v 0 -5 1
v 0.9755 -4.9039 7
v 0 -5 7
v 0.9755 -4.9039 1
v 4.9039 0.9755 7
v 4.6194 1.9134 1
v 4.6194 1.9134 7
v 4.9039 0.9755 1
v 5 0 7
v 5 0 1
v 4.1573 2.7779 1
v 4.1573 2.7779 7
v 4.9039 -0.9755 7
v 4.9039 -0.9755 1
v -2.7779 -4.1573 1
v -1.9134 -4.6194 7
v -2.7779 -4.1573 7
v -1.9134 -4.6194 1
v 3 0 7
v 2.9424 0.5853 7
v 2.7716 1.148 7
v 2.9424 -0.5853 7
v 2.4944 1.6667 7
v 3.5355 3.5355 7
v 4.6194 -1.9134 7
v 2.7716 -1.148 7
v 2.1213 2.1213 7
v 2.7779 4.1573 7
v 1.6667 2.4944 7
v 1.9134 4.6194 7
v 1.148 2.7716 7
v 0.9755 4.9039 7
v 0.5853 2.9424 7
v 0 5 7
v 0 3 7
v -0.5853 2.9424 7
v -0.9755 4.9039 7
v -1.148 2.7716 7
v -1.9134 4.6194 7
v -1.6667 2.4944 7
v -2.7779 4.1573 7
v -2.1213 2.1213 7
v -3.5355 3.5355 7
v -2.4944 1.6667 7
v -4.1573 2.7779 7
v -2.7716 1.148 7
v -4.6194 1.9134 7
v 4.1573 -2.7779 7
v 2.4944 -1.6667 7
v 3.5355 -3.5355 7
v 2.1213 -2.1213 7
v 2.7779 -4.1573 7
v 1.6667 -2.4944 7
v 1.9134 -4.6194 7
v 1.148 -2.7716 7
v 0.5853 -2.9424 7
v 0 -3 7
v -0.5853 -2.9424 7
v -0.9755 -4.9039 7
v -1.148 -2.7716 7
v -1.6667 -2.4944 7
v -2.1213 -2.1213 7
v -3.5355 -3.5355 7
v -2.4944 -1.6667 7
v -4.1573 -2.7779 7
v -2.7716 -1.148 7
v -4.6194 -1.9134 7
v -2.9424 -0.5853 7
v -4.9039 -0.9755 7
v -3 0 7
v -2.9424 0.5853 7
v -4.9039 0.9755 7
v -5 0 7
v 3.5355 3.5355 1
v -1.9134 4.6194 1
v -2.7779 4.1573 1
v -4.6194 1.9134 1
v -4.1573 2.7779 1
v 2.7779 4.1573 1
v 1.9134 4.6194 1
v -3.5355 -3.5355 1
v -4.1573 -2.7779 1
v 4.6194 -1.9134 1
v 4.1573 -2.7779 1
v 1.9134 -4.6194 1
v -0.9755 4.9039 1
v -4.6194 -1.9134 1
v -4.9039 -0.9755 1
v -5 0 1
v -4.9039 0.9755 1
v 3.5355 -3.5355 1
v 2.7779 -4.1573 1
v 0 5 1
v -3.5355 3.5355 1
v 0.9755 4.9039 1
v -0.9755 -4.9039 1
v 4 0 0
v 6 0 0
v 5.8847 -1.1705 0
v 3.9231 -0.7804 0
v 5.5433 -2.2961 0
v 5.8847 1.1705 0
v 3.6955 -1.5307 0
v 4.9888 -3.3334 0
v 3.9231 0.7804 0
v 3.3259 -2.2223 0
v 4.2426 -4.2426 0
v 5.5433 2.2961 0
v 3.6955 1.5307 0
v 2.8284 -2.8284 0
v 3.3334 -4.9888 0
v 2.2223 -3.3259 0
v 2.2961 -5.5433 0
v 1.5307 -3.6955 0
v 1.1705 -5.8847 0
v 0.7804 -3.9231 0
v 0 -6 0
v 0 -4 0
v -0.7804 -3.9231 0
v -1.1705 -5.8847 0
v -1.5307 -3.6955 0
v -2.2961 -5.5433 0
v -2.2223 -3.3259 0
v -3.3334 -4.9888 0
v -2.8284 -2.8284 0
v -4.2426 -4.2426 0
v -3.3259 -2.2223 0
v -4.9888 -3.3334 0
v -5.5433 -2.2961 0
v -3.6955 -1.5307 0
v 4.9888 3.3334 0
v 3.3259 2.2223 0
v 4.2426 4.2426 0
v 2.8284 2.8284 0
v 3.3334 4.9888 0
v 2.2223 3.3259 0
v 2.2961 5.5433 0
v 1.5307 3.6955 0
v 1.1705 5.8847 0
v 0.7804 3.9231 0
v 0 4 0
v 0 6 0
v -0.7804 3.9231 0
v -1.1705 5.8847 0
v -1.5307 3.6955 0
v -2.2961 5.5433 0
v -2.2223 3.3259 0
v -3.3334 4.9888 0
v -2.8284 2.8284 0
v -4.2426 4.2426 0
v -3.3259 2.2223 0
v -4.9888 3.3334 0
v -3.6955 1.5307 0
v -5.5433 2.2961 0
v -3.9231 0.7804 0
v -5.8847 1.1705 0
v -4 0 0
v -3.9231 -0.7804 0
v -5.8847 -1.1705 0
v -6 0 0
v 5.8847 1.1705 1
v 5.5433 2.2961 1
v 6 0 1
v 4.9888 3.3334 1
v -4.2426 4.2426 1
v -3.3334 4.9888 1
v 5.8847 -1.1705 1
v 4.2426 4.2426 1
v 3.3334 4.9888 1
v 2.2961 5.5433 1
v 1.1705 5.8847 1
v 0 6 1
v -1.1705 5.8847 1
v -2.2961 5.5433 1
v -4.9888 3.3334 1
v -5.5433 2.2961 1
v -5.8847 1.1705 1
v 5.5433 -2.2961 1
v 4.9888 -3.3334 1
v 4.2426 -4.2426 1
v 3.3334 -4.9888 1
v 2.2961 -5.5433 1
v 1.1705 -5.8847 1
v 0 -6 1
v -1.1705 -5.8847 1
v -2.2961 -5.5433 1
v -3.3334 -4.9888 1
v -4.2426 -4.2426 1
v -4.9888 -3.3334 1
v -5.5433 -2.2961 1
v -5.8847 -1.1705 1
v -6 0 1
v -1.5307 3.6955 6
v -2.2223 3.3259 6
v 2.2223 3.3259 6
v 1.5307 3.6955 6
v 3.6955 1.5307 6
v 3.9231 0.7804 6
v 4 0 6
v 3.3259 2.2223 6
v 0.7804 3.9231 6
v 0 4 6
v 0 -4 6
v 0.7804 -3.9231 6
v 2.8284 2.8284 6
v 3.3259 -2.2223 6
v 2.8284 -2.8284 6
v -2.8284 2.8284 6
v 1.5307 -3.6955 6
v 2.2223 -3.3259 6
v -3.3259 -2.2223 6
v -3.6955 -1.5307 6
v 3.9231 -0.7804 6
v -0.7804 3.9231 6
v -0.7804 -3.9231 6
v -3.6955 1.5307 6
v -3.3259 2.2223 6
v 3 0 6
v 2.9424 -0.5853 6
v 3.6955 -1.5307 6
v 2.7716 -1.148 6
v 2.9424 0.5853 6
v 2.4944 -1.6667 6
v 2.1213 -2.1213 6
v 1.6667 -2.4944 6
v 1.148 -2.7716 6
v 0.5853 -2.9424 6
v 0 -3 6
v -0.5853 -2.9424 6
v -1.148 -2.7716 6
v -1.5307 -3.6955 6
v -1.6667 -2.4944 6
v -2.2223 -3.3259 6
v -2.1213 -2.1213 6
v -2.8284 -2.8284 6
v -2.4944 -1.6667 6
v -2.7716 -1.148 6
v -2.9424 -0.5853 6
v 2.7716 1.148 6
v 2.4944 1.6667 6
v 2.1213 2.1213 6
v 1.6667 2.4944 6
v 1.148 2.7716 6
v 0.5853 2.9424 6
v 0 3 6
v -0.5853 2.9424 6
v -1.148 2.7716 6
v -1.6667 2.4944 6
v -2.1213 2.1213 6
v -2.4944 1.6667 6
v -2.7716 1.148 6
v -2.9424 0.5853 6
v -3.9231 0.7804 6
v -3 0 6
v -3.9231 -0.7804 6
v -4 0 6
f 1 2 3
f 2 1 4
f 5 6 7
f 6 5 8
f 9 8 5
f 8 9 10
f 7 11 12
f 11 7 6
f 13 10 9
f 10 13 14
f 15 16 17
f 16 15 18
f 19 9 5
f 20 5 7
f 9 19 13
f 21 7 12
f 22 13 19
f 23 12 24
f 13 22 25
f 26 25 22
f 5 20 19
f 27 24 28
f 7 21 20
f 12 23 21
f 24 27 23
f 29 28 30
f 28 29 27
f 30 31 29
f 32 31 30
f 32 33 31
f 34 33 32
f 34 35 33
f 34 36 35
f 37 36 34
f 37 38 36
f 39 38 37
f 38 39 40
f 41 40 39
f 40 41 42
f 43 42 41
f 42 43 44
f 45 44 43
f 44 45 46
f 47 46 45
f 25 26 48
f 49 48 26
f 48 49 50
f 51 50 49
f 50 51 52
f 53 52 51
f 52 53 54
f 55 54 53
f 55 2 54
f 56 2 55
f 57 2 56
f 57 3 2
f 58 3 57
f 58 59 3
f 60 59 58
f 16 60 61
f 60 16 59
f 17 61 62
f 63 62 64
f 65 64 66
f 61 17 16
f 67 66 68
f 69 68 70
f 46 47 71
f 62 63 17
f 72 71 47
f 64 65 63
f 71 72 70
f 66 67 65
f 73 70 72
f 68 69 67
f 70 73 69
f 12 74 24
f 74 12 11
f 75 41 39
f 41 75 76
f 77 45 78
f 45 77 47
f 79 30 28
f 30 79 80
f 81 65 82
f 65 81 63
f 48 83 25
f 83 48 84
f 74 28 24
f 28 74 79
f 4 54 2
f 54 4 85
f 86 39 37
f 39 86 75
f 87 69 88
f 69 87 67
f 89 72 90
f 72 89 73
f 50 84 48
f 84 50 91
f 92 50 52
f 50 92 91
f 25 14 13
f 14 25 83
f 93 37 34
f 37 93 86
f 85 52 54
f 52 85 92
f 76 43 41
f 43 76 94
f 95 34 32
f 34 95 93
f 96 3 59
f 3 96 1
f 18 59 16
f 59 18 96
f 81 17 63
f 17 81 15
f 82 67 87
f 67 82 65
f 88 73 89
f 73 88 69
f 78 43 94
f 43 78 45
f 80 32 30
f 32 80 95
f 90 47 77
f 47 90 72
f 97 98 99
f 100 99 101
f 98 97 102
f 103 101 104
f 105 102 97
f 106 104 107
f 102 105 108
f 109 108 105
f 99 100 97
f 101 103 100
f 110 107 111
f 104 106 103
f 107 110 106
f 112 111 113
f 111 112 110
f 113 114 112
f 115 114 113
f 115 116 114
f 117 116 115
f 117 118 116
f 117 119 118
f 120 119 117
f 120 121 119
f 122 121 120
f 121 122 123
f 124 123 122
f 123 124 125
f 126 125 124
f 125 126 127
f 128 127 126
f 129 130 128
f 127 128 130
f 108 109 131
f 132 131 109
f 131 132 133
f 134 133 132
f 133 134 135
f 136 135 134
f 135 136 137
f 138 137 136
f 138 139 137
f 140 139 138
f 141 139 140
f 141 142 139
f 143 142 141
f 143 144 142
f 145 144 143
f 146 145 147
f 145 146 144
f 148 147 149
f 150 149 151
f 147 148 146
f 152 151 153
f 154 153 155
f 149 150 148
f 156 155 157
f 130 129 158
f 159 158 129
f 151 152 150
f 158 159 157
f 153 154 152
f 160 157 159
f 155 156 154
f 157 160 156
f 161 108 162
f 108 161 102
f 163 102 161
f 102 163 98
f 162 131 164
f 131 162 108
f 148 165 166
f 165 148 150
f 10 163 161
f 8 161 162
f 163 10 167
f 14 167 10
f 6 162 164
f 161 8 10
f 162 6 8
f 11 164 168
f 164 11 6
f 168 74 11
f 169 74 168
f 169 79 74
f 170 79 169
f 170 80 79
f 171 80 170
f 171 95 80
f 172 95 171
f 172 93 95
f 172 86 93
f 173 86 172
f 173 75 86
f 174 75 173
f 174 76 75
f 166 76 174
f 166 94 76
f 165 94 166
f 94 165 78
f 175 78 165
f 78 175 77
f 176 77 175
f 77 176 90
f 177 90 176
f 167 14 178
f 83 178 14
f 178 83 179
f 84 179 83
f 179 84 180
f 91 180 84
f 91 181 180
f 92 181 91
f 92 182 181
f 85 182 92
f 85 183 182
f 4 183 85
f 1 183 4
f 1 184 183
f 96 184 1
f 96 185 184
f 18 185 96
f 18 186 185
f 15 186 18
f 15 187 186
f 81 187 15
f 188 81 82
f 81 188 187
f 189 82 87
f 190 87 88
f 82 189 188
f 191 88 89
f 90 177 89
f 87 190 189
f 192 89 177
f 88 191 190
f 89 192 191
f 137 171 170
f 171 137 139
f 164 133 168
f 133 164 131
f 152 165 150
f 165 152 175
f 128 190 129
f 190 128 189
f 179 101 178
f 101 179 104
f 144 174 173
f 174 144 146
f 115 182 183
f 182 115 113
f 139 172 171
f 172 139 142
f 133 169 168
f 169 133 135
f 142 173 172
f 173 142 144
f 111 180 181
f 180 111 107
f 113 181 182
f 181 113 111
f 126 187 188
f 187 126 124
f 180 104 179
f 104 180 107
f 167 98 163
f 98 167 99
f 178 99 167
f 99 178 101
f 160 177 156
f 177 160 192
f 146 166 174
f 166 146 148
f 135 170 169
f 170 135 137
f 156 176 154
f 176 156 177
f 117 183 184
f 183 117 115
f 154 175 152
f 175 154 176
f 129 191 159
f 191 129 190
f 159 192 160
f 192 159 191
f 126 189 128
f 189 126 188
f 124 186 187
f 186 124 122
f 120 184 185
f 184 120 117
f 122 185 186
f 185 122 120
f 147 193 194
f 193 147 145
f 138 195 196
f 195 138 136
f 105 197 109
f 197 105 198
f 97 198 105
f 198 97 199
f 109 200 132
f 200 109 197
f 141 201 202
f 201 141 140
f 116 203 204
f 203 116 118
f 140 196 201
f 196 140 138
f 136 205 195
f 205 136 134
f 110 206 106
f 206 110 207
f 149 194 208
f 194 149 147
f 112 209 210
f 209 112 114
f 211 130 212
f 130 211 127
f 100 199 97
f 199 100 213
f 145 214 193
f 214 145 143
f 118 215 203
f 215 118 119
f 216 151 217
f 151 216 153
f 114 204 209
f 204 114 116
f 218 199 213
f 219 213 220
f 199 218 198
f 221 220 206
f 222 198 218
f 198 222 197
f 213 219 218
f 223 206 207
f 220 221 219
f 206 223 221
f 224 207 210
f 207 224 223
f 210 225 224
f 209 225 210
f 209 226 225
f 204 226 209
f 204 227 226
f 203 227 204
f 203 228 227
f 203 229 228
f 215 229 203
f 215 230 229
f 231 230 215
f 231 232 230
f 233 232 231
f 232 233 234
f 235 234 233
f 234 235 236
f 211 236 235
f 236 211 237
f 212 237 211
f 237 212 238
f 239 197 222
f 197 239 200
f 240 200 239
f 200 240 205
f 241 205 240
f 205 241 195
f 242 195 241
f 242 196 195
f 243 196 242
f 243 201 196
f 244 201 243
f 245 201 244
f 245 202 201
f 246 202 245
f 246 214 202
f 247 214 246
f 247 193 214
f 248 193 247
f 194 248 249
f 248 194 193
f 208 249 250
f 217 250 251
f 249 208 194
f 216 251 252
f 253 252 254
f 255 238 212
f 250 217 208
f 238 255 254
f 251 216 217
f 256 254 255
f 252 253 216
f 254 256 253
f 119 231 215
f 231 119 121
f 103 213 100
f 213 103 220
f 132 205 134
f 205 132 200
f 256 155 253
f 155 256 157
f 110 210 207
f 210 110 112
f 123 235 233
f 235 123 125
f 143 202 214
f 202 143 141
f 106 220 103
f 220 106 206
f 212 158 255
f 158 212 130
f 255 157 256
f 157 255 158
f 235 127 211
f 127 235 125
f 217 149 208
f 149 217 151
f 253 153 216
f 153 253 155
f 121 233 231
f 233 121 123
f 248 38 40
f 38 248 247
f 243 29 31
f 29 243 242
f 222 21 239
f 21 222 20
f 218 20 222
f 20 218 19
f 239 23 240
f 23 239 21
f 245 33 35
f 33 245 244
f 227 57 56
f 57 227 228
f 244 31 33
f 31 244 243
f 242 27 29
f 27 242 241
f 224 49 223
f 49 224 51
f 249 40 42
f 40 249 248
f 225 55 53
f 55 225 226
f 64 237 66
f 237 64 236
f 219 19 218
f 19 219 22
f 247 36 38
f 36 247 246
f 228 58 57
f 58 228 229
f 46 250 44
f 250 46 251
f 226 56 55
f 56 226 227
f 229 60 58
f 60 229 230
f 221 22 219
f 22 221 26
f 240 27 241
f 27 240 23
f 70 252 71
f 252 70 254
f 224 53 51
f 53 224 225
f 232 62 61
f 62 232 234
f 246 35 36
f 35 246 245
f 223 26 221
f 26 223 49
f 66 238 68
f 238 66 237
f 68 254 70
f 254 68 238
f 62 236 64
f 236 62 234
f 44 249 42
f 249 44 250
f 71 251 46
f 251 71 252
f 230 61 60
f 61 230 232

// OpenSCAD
$fn=32;

wall=1;
inner=8;
H=6;
eps=0.1;
offs=0.4;
Hi=13.3-H-2*wall;

color("blue",0.5)
difference()
{
	union()
	{
		cylinder(h=H+wall,d=inner+2*wall);
		cylinder(h=wall,d=12);
	}
	translate([0,0,-eps])
	cylinder(h=H+eps,d=inner);
	
	cylinder(h=20,d=inner-2*wall);
}

*color("red",0.5)
translate([0,0,H-wall])
difference()
{
	union()
	{
		cylinder(h=Hi+wall,d=inner-2*wall-offs);
		cylinder(h=wall,d=inner-offs);
	}
	translate([0,0,-eps])
	cylinder(h=Hi+eps,d=inner-4*wall+offs);
}
